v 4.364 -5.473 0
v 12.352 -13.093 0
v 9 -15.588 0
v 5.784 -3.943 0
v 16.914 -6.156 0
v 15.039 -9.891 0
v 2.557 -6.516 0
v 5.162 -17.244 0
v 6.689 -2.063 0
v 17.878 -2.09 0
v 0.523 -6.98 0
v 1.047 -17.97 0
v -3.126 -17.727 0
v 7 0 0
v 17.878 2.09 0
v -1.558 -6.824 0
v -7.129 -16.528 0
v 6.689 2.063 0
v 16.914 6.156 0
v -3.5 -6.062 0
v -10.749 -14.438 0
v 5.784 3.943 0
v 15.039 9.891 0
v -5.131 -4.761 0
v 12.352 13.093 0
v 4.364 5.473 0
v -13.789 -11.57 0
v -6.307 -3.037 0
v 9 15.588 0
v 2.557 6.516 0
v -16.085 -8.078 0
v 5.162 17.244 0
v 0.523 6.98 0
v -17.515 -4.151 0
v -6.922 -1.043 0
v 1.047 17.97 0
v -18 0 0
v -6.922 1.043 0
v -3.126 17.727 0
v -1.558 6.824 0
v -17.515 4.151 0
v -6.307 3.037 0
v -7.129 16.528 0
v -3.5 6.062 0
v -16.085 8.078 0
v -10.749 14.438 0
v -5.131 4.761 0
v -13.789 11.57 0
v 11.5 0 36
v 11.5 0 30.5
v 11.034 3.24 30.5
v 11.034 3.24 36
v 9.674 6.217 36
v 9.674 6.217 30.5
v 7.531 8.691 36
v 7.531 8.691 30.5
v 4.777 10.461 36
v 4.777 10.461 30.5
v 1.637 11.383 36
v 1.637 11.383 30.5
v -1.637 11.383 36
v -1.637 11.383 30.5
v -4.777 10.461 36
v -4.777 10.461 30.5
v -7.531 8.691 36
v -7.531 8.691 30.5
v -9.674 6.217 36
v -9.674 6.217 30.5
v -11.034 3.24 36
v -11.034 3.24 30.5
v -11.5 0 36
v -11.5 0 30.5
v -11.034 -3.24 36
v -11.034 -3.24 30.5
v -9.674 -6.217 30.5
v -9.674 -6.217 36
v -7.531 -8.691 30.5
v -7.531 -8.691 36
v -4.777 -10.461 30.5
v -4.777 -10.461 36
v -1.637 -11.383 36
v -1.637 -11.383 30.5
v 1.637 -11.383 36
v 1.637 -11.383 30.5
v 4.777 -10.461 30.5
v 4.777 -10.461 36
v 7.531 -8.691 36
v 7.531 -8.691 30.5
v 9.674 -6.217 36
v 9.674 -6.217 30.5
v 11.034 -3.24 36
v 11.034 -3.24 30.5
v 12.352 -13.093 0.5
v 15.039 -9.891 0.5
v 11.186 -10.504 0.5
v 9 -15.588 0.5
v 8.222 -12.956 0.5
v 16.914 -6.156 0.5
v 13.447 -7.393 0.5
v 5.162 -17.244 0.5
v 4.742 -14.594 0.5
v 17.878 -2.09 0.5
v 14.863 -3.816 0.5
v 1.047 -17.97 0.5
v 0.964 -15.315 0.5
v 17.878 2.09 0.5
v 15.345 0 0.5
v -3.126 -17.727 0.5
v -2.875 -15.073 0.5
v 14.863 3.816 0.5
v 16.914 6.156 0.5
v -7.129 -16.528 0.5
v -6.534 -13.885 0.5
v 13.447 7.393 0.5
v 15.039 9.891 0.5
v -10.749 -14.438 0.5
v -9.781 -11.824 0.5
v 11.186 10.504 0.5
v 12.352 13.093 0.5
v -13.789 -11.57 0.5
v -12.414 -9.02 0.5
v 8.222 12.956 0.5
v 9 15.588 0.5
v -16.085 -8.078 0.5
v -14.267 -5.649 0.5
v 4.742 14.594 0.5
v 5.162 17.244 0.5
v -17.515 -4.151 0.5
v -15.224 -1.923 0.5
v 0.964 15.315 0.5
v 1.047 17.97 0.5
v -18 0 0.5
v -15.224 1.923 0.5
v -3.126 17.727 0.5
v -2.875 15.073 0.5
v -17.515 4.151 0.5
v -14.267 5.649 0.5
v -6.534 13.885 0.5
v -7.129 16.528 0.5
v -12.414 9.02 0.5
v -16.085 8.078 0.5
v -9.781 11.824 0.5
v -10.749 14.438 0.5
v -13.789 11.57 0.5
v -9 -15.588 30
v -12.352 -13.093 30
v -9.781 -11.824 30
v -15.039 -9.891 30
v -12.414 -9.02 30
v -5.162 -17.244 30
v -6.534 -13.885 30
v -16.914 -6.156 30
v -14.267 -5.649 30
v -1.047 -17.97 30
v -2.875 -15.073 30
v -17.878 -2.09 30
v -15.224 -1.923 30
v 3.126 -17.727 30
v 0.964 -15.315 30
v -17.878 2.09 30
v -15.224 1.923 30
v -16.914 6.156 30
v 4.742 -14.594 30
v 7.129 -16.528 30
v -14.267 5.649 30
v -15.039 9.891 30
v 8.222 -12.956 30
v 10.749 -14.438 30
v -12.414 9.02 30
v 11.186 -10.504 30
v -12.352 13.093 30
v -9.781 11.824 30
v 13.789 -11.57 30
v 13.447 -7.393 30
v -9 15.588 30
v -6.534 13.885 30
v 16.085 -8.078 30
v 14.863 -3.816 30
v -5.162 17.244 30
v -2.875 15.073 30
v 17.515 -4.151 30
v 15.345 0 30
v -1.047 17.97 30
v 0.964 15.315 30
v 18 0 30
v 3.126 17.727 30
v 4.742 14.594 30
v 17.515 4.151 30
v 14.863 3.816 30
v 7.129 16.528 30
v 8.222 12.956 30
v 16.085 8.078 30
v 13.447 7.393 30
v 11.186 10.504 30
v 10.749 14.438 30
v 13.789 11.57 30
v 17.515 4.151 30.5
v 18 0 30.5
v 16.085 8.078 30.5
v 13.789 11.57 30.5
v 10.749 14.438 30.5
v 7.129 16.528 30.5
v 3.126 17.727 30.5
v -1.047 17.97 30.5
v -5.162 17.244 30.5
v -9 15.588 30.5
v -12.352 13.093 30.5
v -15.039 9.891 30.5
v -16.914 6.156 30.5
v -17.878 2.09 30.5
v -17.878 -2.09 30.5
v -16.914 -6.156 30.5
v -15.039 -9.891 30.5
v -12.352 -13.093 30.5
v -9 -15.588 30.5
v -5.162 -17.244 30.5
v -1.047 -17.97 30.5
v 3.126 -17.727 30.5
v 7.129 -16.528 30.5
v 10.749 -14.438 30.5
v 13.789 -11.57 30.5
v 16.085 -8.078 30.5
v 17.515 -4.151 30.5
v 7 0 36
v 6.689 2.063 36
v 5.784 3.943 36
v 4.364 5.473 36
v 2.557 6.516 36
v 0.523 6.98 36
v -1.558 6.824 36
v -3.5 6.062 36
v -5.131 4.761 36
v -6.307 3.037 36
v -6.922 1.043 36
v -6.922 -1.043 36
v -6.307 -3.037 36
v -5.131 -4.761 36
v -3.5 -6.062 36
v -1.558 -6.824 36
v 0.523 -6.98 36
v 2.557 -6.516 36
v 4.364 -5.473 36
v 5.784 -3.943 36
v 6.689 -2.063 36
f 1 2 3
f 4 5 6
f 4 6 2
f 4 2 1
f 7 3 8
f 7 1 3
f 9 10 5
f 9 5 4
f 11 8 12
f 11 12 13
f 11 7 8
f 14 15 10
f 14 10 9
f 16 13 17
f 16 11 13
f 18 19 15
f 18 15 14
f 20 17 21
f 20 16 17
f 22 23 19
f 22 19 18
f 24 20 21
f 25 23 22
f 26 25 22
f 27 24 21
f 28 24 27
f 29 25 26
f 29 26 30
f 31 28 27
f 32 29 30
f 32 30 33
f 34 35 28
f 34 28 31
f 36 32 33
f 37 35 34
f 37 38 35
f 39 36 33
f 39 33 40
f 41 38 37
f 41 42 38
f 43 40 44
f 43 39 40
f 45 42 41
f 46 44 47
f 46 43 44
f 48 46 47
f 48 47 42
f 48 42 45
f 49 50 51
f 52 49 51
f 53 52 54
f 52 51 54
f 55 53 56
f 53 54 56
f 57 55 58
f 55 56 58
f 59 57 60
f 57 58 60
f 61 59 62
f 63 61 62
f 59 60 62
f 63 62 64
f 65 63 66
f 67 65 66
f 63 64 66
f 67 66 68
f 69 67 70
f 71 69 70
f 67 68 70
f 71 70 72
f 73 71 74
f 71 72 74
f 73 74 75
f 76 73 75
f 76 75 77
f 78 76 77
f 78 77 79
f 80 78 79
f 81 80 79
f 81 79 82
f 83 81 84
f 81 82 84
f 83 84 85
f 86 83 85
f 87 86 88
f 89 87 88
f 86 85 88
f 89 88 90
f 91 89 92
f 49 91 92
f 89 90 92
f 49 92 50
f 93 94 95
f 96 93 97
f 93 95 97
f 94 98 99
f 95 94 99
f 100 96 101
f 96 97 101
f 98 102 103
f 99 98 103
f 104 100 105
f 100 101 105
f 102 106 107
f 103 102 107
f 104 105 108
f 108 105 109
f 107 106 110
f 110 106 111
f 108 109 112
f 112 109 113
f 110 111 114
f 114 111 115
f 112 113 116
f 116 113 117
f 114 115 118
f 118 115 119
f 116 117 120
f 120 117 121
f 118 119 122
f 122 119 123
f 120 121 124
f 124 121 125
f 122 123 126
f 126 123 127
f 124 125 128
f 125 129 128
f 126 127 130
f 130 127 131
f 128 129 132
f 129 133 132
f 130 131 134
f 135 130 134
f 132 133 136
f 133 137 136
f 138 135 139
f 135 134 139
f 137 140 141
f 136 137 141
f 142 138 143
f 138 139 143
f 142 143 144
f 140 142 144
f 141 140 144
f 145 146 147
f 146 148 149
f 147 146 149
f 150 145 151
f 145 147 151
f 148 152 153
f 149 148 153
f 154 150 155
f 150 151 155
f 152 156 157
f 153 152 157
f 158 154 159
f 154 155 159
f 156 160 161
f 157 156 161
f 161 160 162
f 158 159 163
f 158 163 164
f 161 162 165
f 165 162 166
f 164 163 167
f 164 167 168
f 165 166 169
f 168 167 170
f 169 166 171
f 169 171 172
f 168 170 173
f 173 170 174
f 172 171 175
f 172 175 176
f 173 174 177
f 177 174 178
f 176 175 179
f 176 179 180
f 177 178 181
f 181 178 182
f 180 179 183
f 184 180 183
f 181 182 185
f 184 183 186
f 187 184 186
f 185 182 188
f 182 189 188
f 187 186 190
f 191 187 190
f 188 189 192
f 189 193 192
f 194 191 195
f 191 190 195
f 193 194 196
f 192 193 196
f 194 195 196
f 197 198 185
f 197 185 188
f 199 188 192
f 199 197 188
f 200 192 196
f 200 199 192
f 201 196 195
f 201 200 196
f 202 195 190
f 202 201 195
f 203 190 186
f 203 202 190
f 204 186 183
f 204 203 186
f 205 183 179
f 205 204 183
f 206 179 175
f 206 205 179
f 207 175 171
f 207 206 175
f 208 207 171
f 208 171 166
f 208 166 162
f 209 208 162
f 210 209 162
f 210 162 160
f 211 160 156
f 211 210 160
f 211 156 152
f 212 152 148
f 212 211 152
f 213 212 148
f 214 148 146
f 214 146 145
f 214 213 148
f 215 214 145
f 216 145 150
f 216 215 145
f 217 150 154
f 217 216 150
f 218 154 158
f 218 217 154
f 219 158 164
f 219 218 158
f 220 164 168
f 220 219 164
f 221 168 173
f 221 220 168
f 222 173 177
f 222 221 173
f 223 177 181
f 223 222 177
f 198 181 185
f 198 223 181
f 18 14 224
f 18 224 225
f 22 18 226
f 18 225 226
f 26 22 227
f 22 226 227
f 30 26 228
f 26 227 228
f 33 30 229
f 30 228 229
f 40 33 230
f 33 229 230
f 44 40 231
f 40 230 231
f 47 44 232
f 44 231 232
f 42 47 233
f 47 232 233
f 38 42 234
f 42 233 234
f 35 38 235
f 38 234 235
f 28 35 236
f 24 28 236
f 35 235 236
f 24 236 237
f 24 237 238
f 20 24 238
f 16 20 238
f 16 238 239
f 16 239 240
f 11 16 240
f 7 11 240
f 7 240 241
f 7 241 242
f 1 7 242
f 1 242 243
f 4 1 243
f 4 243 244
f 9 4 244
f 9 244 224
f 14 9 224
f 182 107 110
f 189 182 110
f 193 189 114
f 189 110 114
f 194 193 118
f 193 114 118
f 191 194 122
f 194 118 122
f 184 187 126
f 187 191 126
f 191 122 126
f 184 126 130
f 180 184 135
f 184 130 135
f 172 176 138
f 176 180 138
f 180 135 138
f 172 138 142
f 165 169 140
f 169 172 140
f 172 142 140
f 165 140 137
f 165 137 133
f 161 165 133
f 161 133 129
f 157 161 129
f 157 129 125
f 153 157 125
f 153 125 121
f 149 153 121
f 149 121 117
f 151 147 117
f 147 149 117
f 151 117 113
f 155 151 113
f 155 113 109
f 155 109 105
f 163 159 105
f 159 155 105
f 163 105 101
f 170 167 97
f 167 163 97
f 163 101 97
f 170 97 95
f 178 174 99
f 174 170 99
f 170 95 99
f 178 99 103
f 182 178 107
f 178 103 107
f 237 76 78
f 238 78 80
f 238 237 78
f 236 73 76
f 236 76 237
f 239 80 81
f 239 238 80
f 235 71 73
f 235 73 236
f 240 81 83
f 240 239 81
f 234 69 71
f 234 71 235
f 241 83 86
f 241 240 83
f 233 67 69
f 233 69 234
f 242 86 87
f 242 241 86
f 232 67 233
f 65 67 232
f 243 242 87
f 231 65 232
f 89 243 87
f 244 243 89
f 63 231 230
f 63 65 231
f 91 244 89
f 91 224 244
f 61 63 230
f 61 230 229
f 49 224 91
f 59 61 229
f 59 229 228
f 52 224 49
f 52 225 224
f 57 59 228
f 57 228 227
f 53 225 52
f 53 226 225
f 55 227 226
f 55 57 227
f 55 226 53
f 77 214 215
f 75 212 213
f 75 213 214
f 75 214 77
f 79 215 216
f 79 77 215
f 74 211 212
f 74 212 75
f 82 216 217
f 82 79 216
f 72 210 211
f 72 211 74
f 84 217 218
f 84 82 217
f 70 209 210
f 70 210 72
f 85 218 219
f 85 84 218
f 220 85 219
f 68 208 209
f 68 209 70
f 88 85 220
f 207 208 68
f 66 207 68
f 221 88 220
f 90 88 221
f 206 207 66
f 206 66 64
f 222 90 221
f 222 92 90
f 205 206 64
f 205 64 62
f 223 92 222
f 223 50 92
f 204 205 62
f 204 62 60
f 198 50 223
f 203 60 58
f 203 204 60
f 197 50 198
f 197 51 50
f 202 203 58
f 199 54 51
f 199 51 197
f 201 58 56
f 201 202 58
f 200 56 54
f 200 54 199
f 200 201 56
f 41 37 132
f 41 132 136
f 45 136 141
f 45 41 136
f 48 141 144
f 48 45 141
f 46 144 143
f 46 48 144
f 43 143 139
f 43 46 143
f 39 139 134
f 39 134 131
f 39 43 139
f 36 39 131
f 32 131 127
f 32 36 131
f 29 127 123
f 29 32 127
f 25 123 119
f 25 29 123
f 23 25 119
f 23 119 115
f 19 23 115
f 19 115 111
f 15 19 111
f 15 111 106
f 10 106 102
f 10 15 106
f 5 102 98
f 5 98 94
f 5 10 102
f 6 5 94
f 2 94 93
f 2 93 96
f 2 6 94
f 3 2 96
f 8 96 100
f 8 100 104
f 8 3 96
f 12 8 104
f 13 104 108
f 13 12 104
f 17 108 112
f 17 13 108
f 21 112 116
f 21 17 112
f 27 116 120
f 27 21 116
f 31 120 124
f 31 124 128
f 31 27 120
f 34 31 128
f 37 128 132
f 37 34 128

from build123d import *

# Parameters (mm, degrees)
SZKIC1_R                    = 15.345
DODANIE_WYCI_GNI_CIE1_DEPTH = 30.5
SZKIC2_R                    = 11.5
DODANIE_WYCI_GNI_CIE2_DEPTH = 5.5
SZKIC3_R                    = 18
DODANIE_WYCI_GNI_CIE3_DEPTH = 0.5
SZKIC9_R                    = 18
DODANIE_WYCI_GNI_CIE6_DEPTH = 0.5
SZKIC6_R                    = 7
WYTNIJ_WYCI_GNI_CIE1_DEPTH  = 37


with BuildPart() as part:
    # Szkic1 → Dodanie-wyciągnięcie1 (new body)
    with BuildSketch(Plane.XY):
        Circle(SZKIC1_R)
    extrude(amount=DODANIE_WYCI_GNI_CIE1_DEPTH)

    # Szkic2 → Dodanie-wyciągnięcie2 (add)
    with BuildSketch(Plane.XY.offset(30.5)):
        Circle(SZKIC2_R)
    extrude(amount=DODANIE_WYCI_GNI_CIE2_DEPTH)

    # Szkic3 → Dodanie-wyciągnięcie3 (add)
    with BuildSketch(Plane.XY.offset(30.5)):
        Circle(SZKIC3_R)
    extrude(amount=-DODANIE_WYCI_GNI_CIE3_DEPTH)

    # Szkic9 → Dodanie-wyciągnięcie6 (add)
    with BuildSketch(Plane(origin=(0, 0, 0), x_dir=(-1, 0, 0), z_dir=(0, 0, -1))):
        Circle(SZKIC9_R)
    extrude(amount=-DODANIE_WYCI_GNI_CIE6_DEPTH)

    # Szkic6 → Wytnij-wyciągnięcie1 (cut, through all)
    with BuildSketch(Plane.XY.offset(36)):
        Circle(SZKIC6_R)
    extrude(amount=-WYTNIJ_WYCI_GNI_CIE1_DEPTH, mode=Mode.SUBTRACT)


solid = part.part
